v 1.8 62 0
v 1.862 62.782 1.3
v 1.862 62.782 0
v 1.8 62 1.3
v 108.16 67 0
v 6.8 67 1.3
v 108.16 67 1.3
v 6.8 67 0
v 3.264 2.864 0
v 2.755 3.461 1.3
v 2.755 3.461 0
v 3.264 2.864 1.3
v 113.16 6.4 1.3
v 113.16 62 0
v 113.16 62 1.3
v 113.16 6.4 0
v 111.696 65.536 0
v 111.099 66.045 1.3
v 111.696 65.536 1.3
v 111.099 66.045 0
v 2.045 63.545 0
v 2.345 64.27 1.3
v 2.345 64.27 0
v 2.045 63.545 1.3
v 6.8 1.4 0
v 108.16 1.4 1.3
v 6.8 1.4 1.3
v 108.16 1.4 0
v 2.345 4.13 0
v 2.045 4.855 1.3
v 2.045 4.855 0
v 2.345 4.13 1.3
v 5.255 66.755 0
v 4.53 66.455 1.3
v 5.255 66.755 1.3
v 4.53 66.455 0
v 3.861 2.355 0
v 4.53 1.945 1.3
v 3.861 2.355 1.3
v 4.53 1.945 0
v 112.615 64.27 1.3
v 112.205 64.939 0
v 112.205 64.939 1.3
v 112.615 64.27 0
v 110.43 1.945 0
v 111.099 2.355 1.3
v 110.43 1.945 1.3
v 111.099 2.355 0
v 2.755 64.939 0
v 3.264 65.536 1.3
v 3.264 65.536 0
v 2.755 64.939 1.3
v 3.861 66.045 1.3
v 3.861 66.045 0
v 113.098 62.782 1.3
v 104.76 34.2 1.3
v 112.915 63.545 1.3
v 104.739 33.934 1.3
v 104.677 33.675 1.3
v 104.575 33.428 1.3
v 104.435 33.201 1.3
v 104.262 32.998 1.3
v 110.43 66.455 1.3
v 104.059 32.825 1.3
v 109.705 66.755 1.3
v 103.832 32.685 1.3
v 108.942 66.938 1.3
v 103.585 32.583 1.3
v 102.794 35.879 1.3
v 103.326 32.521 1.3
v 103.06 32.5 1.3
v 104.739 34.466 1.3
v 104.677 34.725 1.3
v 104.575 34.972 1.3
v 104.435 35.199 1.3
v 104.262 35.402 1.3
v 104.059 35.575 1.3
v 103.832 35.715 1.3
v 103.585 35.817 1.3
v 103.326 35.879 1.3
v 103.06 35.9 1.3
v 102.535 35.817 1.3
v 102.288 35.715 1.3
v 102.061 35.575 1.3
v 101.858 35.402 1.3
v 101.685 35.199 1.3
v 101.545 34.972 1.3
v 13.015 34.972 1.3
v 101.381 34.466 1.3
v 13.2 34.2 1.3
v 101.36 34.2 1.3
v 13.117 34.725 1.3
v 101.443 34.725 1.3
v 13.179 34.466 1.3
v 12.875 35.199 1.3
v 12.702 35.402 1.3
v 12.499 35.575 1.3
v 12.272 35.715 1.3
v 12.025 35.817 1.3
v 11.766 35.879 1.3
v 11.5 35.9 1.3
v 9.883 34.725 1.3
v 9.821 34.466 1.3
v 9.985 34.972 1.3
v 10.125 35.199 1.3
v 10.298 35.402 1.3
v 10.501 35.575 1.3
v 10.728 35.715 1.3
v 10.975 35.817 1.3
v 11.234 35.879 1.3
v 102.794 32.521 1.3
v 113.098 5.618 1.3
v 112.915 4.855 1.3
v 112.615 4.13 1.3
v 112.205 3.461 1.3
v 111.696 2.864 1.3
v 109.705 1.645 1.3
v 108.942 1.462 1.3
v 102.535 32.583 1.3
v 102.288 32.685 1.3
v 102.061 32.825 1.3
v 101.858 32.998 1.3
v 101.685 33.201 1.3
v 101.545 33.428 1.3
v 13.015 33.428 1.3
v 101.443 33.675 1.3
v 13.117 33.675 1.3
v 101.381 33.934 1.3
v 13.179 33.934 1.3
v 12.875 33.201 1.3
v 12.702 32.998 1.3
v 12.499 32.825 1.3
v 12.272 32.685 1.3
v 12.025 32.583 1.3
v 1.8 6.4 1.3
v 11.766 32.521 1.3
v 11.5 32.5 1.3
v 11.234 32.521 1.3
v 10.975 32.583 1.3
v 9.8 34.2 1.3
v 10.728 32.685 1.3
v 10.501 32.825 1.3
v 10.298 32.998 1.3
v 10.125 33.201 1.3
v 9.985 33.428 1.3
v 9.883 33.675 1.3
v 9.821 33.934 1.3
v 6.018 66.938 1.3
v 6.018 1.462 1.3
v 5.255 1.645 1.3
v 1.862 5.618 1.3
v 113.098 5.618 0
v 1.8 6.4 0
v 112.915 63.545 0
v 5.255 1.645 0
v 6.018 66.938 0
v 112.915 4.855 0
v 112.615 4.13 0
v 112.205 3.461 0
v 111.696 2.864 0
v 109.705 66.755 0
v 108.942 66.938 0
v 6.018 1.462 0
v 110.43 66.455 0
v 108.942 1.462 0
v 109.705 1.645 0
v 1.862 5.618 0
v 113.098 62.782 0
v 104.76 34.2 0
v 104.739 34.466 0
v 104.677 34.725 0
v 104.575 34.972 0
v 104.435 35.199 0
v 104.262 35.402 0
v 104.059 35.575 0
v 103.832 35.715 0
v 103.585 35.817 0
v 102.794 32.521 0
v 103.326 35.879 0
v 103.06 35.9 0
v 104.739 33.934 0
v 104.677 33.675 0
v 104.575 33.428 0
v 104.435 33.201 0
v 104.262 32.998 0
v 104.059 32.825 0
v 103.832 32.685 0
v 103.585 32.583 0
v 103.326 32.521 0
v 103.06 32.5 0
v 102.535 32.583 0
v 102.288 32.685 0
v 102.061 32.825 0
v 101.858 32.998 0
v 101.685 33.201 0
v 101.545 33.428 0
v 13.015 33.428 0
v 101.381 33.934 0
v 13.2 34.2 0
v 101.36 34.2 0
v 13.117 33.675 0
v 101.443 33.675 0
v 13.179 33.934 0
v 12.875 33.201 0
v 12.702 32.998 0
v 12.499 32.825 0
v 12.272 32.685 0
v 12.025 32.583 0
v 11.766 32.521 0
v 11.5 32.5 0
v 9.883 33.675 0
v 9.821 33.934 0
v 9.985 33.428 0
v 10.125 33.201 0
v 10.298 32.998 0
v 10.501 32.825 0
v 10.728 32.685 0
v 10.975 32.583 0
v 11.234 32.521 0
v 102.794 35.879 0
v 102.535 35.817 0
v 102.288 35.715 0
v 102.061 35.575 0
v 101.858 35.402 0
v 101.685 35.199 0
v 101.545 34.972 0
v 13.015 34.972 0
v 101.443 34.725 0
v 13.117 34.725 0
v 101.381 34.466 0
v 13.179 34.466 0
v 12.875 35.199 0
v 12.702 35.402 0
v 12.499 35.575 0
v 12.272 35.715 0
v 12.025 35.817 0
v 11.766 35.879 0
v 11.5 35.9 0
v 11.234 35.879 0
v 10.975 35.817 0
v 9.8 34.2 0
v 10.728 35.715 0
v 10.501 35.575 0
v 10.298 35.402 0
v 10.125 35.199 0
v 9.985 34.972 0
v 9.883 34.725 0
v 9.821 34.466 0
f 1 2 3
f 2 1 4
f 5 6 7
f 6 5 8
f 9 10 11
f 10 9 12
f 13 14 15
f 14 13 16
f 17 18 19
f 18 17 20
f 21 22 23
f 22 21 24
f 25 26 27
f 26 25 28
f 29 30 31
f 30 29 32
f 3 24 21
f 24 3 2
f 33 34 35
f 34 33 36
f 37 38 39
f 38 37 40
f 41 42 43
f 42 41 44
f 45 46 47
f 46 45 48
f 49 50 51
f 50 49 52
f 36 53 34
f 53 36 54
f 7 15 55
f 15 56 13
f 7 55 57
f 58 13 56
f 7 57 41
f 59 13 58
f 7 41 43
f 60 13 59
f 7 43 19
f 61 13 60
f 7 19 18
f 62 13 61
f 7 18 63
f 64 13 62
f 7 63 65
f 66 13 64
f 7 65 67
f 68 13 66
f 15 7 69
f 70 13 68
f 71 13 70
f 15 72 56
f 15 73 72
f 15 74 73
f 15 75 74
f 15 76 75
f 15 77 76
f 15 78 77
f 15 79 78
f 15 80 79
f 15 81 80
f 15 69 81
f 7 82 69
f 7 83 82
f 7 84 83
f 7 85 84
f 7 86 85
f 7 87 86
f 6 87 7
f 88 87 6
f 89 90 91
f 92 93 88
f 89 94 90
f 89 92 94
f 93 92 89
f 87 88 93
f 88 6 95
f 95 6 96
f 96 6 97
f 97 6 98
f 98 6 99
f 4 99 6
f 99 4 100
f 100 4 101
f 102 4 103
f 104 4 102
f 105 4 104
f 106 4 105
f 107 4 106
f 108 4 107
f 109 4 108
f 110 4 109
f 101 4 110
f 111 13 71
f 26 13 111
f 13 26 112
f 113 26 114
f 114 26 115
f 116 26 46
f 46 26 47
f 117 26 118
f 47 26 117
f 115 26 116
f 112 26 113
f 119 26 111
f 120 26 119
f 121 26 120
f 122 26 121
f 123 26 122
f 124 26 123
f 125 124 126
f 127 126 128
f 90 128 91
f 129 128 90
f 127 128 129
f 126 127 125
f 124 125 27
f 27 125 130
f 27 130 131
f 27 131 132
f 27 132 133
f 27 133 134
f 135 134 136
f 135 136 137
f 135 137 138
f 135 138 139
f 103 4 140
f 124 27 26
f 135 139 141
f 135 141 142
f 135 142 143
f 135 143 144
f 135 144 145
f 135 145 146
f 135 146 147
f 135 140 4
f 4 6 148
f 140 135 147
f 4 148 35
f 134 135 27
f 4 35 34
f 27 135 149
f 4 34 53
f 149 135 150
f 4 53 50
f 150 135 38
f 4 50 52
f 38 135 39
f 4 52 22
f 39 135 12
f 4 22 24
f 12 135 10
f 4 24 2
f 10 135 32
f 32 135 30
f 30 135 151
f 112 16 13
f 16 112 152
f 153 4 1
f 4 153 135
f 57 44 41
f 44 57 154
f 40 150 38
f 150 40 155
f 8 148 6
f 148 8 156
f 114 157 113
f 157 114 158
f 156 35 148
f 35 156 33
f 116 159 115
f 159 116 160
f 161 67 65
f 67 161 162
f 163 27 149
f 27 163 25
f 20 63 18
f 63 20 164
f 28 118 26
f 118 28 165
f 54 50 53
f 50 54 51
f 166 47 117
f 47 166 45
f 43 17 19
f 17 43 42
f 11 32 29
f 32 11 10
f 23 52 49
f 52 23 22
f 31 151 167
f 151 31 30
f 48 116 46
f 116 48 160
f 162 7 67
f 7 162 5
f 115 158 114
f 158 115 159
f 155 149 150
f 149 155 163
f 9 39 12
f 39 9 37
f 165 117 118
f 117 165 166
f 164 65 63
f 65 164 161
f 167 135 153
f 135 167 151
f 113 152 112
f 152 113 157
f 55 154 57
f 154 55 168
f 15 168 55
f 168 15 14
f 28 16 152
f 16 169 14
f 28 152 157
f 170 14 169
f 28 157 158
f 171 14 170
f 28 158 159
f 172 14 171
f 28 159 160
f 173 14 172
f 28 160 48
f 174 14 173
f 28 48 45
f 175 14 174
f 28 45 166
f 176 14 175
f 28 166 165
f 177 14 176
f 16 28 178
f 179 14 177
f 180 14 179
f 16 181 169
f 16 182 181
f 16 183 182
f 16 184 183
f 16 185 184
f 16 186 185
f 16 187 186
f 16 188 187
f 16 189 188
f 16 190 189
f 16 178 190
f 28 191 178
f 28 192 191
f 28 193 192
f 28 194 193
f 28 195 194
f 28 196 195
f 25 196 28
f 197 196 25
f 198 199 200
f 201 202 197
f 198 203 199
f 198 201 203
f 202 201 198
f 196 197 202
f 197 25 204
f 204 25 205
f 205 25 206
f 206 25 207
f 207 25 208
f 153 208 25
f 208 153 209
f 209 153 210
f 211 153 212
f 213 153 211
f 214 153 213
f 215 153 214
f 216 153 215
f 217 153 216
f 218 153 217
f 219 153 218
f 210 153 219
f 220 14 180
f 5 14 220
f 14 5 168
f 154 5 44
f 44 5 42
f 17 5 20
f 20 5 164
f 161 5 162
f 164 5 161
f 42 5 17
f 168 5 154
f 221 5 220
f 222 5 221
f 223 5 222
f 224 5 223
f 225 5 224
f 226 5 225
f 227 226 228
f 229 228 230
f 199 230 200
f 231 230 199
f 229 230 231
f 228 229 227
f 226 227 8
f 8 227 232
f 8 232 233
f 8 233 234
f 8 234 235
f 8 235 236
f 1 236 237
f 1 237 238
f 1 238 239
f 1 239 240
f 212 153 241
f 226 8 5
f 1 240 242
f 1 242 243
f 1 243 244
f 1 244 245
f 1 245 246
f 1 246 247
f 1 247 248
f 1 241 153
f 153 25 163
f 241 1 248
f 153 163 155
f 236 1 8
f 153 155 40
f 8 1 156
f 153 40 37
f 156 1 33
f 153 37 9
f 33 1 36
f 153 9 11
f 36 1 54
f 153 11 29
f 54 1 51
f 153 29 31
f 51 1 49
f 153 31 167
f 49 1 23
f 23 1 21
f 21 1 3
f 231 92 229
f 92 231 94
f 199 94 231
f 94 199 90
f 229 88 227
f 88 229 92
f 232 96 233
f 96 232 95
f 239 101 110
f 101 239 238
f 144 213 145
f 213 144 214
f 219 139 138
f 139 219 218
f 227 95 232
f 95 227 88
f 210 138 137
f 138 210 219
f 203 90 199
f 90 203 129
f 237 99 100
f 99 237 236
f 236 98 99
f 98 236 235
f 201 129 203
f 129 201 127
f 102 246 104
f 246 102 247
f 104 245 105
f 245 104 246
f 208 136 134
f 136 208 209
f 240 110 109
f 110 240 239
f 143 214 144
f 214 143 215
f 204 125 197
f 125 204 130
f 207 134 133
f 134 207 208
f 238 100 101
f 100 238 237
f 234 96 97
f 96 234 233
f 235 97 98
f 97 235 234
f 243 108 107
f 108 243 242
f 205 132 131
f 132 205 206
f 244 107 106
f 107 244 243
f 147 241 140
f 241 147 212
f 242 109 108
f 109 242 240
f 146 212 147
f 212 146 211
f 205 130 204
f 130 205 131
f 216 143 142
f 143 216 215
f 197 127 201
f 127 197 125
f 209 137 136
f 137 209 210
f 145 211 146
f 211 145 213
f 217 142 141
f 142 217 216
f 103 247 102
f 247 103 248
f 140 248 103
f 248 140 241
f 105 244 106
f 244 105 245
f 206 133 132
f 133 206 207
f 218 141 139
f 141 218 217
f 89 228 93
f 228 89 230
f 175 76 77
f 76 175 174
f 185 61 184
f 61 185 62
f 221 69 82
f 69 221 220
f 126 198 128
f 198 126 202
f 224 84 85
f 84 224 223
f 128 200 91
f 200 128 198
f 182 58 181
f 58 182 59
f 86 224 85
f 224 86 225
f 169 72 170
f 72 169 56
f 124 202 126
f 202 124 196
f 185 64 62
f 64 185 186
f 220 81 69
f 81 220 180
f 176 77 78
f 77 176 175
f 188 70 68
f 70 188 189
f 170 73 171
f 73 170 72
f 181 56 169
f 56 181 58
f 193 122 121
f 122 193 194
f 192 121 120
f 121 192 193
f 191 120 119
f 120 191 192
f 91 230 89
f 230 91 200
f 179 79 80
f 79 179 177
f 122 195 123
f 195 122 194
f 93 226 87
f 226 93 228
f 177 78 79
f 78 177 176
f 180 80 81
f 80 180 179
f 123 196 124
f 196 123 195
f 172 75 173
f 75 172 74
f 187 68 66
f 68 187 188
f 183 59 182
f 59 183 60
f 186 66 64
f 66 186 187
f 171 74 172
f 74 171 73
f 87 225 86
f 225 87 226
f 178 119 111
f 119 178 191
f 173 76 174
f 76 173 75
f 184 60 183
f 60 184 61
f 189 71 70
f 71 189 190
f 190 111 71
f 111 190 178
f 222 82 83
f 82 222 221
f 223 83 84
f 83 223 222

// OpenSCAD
// file: ../configuration.scad
$fn=40; // model faces resolution.

//OBECNE PARAMETRY 
//----------------------------------------------------------------
//----------------------------------------------------------------

//pro PLBASE
pocet_der1=11; //x
pocet_der2=6; //ovlivňuje výšku krabičky
radidus_hrany=5;
vzdalenost_der=10.16;
vzdalenost_od_okraje=vzdalenost_der/2;
prumer_sroubu=3.4;
tloustka_plbase=2;
prekryti_der=-2;

//WINDGAUGE02A_D02 //uchyt na sloup
D02_sila_materialu=5;
D02_vyska_uchytky=40;
D02_prumer_obruby=27; //3/4 trubka
D02_delka_celeho_uchytu=60;
D02_dotahova_vzdalenost=1.5;
D02_prumer_uchytneho_sroubu=4.2;
D02_sirka_matky=9.2; //pro M4
D02_vyska_matky=3;




D02_vyska_boxu_pod_plbase=6;
D02_vyska_boxu_nad_plbase=50;
D02_zapusteni_spodniho_krytu=10;
D02_sila_materialu=1.2;
D02_dolerance_na_zasunuti=0.4; //tolerance je pro obě strany

drzak_sroubu_hloubka=15;
drzak_sroubu_vyska=10;
matka_vyska=3;
// main file
include <../configuration.scad>
AWSBOX01A_D03();
module AWSBOX01A_D03(){
difference () {

translate([D02_sila_materialu+3/2*D02_dolerance_na_zasunuti+radidus_hrany,D02_sila_materialu+radidus_hrany+D02_dolerance_na_zasunuti/2,0])
minkowski()
    {
	cube([(pocet_der1-1)*vzdalenost_der+2*vzdalenost_od_okraje-2*radidus_hrany-D02_dolerance_na_zasunuti,D02_vyska_boxu_pod_plbase+D02_vyska_boxu_nad_plbase-D02_dolerance_na_zasunuti,D02_sila_materialu]);          // base plastics brick
        cylinder(r=radidus_hrany,h=0.1);
    }
    
    
    
    //drzáky spodního krytu

translate([0,(D02_vyska_boxu_pod_plbase+D02_vyska_boxu_nad_plbase+2*D02_sila_materialu+2*radidus_hrany)/2-(prumer_sroubu+3*D02_sila_materialu)/2,-0.01])

translate([drzak_sroubu_hloubka-prumer_sroubu/2-1.5*D02_sila_materialu,(prumer_sroubu+3*D02_sila_materialu)/2,-0.001])
     cylinder(h=3*drzak_sroubu_vyska, r=prumer_sroubu/2, center=false);


translate([(pocet_der1-1)*vzdalenost_der+2*vzdalenost_od_okraje+2*D02_sila_materialu+D02_dolerance_na_zasunuti,(D02_vyska_boxu_pod_plbase+D02_vyska_boxu_nad_plbase+2*D02_sila_materialu+2*radidus_hrany)/2+(prumer_sroubu+3*D02_sila_materialu)/2,-0.01])
 rotate([0,0,180])

translate([drzak_sroubu_hloubka-prumer_sroubu/2-1.5*D02_sila_materialu,(prumer_sroubu+3*D02_sila_materialu)/2,-0.001])
     cylinder(h=3*drzak_sroubu_vyska, r=prumer_sroubu/2, center=false);
    
    
      }
  }    
      
 
